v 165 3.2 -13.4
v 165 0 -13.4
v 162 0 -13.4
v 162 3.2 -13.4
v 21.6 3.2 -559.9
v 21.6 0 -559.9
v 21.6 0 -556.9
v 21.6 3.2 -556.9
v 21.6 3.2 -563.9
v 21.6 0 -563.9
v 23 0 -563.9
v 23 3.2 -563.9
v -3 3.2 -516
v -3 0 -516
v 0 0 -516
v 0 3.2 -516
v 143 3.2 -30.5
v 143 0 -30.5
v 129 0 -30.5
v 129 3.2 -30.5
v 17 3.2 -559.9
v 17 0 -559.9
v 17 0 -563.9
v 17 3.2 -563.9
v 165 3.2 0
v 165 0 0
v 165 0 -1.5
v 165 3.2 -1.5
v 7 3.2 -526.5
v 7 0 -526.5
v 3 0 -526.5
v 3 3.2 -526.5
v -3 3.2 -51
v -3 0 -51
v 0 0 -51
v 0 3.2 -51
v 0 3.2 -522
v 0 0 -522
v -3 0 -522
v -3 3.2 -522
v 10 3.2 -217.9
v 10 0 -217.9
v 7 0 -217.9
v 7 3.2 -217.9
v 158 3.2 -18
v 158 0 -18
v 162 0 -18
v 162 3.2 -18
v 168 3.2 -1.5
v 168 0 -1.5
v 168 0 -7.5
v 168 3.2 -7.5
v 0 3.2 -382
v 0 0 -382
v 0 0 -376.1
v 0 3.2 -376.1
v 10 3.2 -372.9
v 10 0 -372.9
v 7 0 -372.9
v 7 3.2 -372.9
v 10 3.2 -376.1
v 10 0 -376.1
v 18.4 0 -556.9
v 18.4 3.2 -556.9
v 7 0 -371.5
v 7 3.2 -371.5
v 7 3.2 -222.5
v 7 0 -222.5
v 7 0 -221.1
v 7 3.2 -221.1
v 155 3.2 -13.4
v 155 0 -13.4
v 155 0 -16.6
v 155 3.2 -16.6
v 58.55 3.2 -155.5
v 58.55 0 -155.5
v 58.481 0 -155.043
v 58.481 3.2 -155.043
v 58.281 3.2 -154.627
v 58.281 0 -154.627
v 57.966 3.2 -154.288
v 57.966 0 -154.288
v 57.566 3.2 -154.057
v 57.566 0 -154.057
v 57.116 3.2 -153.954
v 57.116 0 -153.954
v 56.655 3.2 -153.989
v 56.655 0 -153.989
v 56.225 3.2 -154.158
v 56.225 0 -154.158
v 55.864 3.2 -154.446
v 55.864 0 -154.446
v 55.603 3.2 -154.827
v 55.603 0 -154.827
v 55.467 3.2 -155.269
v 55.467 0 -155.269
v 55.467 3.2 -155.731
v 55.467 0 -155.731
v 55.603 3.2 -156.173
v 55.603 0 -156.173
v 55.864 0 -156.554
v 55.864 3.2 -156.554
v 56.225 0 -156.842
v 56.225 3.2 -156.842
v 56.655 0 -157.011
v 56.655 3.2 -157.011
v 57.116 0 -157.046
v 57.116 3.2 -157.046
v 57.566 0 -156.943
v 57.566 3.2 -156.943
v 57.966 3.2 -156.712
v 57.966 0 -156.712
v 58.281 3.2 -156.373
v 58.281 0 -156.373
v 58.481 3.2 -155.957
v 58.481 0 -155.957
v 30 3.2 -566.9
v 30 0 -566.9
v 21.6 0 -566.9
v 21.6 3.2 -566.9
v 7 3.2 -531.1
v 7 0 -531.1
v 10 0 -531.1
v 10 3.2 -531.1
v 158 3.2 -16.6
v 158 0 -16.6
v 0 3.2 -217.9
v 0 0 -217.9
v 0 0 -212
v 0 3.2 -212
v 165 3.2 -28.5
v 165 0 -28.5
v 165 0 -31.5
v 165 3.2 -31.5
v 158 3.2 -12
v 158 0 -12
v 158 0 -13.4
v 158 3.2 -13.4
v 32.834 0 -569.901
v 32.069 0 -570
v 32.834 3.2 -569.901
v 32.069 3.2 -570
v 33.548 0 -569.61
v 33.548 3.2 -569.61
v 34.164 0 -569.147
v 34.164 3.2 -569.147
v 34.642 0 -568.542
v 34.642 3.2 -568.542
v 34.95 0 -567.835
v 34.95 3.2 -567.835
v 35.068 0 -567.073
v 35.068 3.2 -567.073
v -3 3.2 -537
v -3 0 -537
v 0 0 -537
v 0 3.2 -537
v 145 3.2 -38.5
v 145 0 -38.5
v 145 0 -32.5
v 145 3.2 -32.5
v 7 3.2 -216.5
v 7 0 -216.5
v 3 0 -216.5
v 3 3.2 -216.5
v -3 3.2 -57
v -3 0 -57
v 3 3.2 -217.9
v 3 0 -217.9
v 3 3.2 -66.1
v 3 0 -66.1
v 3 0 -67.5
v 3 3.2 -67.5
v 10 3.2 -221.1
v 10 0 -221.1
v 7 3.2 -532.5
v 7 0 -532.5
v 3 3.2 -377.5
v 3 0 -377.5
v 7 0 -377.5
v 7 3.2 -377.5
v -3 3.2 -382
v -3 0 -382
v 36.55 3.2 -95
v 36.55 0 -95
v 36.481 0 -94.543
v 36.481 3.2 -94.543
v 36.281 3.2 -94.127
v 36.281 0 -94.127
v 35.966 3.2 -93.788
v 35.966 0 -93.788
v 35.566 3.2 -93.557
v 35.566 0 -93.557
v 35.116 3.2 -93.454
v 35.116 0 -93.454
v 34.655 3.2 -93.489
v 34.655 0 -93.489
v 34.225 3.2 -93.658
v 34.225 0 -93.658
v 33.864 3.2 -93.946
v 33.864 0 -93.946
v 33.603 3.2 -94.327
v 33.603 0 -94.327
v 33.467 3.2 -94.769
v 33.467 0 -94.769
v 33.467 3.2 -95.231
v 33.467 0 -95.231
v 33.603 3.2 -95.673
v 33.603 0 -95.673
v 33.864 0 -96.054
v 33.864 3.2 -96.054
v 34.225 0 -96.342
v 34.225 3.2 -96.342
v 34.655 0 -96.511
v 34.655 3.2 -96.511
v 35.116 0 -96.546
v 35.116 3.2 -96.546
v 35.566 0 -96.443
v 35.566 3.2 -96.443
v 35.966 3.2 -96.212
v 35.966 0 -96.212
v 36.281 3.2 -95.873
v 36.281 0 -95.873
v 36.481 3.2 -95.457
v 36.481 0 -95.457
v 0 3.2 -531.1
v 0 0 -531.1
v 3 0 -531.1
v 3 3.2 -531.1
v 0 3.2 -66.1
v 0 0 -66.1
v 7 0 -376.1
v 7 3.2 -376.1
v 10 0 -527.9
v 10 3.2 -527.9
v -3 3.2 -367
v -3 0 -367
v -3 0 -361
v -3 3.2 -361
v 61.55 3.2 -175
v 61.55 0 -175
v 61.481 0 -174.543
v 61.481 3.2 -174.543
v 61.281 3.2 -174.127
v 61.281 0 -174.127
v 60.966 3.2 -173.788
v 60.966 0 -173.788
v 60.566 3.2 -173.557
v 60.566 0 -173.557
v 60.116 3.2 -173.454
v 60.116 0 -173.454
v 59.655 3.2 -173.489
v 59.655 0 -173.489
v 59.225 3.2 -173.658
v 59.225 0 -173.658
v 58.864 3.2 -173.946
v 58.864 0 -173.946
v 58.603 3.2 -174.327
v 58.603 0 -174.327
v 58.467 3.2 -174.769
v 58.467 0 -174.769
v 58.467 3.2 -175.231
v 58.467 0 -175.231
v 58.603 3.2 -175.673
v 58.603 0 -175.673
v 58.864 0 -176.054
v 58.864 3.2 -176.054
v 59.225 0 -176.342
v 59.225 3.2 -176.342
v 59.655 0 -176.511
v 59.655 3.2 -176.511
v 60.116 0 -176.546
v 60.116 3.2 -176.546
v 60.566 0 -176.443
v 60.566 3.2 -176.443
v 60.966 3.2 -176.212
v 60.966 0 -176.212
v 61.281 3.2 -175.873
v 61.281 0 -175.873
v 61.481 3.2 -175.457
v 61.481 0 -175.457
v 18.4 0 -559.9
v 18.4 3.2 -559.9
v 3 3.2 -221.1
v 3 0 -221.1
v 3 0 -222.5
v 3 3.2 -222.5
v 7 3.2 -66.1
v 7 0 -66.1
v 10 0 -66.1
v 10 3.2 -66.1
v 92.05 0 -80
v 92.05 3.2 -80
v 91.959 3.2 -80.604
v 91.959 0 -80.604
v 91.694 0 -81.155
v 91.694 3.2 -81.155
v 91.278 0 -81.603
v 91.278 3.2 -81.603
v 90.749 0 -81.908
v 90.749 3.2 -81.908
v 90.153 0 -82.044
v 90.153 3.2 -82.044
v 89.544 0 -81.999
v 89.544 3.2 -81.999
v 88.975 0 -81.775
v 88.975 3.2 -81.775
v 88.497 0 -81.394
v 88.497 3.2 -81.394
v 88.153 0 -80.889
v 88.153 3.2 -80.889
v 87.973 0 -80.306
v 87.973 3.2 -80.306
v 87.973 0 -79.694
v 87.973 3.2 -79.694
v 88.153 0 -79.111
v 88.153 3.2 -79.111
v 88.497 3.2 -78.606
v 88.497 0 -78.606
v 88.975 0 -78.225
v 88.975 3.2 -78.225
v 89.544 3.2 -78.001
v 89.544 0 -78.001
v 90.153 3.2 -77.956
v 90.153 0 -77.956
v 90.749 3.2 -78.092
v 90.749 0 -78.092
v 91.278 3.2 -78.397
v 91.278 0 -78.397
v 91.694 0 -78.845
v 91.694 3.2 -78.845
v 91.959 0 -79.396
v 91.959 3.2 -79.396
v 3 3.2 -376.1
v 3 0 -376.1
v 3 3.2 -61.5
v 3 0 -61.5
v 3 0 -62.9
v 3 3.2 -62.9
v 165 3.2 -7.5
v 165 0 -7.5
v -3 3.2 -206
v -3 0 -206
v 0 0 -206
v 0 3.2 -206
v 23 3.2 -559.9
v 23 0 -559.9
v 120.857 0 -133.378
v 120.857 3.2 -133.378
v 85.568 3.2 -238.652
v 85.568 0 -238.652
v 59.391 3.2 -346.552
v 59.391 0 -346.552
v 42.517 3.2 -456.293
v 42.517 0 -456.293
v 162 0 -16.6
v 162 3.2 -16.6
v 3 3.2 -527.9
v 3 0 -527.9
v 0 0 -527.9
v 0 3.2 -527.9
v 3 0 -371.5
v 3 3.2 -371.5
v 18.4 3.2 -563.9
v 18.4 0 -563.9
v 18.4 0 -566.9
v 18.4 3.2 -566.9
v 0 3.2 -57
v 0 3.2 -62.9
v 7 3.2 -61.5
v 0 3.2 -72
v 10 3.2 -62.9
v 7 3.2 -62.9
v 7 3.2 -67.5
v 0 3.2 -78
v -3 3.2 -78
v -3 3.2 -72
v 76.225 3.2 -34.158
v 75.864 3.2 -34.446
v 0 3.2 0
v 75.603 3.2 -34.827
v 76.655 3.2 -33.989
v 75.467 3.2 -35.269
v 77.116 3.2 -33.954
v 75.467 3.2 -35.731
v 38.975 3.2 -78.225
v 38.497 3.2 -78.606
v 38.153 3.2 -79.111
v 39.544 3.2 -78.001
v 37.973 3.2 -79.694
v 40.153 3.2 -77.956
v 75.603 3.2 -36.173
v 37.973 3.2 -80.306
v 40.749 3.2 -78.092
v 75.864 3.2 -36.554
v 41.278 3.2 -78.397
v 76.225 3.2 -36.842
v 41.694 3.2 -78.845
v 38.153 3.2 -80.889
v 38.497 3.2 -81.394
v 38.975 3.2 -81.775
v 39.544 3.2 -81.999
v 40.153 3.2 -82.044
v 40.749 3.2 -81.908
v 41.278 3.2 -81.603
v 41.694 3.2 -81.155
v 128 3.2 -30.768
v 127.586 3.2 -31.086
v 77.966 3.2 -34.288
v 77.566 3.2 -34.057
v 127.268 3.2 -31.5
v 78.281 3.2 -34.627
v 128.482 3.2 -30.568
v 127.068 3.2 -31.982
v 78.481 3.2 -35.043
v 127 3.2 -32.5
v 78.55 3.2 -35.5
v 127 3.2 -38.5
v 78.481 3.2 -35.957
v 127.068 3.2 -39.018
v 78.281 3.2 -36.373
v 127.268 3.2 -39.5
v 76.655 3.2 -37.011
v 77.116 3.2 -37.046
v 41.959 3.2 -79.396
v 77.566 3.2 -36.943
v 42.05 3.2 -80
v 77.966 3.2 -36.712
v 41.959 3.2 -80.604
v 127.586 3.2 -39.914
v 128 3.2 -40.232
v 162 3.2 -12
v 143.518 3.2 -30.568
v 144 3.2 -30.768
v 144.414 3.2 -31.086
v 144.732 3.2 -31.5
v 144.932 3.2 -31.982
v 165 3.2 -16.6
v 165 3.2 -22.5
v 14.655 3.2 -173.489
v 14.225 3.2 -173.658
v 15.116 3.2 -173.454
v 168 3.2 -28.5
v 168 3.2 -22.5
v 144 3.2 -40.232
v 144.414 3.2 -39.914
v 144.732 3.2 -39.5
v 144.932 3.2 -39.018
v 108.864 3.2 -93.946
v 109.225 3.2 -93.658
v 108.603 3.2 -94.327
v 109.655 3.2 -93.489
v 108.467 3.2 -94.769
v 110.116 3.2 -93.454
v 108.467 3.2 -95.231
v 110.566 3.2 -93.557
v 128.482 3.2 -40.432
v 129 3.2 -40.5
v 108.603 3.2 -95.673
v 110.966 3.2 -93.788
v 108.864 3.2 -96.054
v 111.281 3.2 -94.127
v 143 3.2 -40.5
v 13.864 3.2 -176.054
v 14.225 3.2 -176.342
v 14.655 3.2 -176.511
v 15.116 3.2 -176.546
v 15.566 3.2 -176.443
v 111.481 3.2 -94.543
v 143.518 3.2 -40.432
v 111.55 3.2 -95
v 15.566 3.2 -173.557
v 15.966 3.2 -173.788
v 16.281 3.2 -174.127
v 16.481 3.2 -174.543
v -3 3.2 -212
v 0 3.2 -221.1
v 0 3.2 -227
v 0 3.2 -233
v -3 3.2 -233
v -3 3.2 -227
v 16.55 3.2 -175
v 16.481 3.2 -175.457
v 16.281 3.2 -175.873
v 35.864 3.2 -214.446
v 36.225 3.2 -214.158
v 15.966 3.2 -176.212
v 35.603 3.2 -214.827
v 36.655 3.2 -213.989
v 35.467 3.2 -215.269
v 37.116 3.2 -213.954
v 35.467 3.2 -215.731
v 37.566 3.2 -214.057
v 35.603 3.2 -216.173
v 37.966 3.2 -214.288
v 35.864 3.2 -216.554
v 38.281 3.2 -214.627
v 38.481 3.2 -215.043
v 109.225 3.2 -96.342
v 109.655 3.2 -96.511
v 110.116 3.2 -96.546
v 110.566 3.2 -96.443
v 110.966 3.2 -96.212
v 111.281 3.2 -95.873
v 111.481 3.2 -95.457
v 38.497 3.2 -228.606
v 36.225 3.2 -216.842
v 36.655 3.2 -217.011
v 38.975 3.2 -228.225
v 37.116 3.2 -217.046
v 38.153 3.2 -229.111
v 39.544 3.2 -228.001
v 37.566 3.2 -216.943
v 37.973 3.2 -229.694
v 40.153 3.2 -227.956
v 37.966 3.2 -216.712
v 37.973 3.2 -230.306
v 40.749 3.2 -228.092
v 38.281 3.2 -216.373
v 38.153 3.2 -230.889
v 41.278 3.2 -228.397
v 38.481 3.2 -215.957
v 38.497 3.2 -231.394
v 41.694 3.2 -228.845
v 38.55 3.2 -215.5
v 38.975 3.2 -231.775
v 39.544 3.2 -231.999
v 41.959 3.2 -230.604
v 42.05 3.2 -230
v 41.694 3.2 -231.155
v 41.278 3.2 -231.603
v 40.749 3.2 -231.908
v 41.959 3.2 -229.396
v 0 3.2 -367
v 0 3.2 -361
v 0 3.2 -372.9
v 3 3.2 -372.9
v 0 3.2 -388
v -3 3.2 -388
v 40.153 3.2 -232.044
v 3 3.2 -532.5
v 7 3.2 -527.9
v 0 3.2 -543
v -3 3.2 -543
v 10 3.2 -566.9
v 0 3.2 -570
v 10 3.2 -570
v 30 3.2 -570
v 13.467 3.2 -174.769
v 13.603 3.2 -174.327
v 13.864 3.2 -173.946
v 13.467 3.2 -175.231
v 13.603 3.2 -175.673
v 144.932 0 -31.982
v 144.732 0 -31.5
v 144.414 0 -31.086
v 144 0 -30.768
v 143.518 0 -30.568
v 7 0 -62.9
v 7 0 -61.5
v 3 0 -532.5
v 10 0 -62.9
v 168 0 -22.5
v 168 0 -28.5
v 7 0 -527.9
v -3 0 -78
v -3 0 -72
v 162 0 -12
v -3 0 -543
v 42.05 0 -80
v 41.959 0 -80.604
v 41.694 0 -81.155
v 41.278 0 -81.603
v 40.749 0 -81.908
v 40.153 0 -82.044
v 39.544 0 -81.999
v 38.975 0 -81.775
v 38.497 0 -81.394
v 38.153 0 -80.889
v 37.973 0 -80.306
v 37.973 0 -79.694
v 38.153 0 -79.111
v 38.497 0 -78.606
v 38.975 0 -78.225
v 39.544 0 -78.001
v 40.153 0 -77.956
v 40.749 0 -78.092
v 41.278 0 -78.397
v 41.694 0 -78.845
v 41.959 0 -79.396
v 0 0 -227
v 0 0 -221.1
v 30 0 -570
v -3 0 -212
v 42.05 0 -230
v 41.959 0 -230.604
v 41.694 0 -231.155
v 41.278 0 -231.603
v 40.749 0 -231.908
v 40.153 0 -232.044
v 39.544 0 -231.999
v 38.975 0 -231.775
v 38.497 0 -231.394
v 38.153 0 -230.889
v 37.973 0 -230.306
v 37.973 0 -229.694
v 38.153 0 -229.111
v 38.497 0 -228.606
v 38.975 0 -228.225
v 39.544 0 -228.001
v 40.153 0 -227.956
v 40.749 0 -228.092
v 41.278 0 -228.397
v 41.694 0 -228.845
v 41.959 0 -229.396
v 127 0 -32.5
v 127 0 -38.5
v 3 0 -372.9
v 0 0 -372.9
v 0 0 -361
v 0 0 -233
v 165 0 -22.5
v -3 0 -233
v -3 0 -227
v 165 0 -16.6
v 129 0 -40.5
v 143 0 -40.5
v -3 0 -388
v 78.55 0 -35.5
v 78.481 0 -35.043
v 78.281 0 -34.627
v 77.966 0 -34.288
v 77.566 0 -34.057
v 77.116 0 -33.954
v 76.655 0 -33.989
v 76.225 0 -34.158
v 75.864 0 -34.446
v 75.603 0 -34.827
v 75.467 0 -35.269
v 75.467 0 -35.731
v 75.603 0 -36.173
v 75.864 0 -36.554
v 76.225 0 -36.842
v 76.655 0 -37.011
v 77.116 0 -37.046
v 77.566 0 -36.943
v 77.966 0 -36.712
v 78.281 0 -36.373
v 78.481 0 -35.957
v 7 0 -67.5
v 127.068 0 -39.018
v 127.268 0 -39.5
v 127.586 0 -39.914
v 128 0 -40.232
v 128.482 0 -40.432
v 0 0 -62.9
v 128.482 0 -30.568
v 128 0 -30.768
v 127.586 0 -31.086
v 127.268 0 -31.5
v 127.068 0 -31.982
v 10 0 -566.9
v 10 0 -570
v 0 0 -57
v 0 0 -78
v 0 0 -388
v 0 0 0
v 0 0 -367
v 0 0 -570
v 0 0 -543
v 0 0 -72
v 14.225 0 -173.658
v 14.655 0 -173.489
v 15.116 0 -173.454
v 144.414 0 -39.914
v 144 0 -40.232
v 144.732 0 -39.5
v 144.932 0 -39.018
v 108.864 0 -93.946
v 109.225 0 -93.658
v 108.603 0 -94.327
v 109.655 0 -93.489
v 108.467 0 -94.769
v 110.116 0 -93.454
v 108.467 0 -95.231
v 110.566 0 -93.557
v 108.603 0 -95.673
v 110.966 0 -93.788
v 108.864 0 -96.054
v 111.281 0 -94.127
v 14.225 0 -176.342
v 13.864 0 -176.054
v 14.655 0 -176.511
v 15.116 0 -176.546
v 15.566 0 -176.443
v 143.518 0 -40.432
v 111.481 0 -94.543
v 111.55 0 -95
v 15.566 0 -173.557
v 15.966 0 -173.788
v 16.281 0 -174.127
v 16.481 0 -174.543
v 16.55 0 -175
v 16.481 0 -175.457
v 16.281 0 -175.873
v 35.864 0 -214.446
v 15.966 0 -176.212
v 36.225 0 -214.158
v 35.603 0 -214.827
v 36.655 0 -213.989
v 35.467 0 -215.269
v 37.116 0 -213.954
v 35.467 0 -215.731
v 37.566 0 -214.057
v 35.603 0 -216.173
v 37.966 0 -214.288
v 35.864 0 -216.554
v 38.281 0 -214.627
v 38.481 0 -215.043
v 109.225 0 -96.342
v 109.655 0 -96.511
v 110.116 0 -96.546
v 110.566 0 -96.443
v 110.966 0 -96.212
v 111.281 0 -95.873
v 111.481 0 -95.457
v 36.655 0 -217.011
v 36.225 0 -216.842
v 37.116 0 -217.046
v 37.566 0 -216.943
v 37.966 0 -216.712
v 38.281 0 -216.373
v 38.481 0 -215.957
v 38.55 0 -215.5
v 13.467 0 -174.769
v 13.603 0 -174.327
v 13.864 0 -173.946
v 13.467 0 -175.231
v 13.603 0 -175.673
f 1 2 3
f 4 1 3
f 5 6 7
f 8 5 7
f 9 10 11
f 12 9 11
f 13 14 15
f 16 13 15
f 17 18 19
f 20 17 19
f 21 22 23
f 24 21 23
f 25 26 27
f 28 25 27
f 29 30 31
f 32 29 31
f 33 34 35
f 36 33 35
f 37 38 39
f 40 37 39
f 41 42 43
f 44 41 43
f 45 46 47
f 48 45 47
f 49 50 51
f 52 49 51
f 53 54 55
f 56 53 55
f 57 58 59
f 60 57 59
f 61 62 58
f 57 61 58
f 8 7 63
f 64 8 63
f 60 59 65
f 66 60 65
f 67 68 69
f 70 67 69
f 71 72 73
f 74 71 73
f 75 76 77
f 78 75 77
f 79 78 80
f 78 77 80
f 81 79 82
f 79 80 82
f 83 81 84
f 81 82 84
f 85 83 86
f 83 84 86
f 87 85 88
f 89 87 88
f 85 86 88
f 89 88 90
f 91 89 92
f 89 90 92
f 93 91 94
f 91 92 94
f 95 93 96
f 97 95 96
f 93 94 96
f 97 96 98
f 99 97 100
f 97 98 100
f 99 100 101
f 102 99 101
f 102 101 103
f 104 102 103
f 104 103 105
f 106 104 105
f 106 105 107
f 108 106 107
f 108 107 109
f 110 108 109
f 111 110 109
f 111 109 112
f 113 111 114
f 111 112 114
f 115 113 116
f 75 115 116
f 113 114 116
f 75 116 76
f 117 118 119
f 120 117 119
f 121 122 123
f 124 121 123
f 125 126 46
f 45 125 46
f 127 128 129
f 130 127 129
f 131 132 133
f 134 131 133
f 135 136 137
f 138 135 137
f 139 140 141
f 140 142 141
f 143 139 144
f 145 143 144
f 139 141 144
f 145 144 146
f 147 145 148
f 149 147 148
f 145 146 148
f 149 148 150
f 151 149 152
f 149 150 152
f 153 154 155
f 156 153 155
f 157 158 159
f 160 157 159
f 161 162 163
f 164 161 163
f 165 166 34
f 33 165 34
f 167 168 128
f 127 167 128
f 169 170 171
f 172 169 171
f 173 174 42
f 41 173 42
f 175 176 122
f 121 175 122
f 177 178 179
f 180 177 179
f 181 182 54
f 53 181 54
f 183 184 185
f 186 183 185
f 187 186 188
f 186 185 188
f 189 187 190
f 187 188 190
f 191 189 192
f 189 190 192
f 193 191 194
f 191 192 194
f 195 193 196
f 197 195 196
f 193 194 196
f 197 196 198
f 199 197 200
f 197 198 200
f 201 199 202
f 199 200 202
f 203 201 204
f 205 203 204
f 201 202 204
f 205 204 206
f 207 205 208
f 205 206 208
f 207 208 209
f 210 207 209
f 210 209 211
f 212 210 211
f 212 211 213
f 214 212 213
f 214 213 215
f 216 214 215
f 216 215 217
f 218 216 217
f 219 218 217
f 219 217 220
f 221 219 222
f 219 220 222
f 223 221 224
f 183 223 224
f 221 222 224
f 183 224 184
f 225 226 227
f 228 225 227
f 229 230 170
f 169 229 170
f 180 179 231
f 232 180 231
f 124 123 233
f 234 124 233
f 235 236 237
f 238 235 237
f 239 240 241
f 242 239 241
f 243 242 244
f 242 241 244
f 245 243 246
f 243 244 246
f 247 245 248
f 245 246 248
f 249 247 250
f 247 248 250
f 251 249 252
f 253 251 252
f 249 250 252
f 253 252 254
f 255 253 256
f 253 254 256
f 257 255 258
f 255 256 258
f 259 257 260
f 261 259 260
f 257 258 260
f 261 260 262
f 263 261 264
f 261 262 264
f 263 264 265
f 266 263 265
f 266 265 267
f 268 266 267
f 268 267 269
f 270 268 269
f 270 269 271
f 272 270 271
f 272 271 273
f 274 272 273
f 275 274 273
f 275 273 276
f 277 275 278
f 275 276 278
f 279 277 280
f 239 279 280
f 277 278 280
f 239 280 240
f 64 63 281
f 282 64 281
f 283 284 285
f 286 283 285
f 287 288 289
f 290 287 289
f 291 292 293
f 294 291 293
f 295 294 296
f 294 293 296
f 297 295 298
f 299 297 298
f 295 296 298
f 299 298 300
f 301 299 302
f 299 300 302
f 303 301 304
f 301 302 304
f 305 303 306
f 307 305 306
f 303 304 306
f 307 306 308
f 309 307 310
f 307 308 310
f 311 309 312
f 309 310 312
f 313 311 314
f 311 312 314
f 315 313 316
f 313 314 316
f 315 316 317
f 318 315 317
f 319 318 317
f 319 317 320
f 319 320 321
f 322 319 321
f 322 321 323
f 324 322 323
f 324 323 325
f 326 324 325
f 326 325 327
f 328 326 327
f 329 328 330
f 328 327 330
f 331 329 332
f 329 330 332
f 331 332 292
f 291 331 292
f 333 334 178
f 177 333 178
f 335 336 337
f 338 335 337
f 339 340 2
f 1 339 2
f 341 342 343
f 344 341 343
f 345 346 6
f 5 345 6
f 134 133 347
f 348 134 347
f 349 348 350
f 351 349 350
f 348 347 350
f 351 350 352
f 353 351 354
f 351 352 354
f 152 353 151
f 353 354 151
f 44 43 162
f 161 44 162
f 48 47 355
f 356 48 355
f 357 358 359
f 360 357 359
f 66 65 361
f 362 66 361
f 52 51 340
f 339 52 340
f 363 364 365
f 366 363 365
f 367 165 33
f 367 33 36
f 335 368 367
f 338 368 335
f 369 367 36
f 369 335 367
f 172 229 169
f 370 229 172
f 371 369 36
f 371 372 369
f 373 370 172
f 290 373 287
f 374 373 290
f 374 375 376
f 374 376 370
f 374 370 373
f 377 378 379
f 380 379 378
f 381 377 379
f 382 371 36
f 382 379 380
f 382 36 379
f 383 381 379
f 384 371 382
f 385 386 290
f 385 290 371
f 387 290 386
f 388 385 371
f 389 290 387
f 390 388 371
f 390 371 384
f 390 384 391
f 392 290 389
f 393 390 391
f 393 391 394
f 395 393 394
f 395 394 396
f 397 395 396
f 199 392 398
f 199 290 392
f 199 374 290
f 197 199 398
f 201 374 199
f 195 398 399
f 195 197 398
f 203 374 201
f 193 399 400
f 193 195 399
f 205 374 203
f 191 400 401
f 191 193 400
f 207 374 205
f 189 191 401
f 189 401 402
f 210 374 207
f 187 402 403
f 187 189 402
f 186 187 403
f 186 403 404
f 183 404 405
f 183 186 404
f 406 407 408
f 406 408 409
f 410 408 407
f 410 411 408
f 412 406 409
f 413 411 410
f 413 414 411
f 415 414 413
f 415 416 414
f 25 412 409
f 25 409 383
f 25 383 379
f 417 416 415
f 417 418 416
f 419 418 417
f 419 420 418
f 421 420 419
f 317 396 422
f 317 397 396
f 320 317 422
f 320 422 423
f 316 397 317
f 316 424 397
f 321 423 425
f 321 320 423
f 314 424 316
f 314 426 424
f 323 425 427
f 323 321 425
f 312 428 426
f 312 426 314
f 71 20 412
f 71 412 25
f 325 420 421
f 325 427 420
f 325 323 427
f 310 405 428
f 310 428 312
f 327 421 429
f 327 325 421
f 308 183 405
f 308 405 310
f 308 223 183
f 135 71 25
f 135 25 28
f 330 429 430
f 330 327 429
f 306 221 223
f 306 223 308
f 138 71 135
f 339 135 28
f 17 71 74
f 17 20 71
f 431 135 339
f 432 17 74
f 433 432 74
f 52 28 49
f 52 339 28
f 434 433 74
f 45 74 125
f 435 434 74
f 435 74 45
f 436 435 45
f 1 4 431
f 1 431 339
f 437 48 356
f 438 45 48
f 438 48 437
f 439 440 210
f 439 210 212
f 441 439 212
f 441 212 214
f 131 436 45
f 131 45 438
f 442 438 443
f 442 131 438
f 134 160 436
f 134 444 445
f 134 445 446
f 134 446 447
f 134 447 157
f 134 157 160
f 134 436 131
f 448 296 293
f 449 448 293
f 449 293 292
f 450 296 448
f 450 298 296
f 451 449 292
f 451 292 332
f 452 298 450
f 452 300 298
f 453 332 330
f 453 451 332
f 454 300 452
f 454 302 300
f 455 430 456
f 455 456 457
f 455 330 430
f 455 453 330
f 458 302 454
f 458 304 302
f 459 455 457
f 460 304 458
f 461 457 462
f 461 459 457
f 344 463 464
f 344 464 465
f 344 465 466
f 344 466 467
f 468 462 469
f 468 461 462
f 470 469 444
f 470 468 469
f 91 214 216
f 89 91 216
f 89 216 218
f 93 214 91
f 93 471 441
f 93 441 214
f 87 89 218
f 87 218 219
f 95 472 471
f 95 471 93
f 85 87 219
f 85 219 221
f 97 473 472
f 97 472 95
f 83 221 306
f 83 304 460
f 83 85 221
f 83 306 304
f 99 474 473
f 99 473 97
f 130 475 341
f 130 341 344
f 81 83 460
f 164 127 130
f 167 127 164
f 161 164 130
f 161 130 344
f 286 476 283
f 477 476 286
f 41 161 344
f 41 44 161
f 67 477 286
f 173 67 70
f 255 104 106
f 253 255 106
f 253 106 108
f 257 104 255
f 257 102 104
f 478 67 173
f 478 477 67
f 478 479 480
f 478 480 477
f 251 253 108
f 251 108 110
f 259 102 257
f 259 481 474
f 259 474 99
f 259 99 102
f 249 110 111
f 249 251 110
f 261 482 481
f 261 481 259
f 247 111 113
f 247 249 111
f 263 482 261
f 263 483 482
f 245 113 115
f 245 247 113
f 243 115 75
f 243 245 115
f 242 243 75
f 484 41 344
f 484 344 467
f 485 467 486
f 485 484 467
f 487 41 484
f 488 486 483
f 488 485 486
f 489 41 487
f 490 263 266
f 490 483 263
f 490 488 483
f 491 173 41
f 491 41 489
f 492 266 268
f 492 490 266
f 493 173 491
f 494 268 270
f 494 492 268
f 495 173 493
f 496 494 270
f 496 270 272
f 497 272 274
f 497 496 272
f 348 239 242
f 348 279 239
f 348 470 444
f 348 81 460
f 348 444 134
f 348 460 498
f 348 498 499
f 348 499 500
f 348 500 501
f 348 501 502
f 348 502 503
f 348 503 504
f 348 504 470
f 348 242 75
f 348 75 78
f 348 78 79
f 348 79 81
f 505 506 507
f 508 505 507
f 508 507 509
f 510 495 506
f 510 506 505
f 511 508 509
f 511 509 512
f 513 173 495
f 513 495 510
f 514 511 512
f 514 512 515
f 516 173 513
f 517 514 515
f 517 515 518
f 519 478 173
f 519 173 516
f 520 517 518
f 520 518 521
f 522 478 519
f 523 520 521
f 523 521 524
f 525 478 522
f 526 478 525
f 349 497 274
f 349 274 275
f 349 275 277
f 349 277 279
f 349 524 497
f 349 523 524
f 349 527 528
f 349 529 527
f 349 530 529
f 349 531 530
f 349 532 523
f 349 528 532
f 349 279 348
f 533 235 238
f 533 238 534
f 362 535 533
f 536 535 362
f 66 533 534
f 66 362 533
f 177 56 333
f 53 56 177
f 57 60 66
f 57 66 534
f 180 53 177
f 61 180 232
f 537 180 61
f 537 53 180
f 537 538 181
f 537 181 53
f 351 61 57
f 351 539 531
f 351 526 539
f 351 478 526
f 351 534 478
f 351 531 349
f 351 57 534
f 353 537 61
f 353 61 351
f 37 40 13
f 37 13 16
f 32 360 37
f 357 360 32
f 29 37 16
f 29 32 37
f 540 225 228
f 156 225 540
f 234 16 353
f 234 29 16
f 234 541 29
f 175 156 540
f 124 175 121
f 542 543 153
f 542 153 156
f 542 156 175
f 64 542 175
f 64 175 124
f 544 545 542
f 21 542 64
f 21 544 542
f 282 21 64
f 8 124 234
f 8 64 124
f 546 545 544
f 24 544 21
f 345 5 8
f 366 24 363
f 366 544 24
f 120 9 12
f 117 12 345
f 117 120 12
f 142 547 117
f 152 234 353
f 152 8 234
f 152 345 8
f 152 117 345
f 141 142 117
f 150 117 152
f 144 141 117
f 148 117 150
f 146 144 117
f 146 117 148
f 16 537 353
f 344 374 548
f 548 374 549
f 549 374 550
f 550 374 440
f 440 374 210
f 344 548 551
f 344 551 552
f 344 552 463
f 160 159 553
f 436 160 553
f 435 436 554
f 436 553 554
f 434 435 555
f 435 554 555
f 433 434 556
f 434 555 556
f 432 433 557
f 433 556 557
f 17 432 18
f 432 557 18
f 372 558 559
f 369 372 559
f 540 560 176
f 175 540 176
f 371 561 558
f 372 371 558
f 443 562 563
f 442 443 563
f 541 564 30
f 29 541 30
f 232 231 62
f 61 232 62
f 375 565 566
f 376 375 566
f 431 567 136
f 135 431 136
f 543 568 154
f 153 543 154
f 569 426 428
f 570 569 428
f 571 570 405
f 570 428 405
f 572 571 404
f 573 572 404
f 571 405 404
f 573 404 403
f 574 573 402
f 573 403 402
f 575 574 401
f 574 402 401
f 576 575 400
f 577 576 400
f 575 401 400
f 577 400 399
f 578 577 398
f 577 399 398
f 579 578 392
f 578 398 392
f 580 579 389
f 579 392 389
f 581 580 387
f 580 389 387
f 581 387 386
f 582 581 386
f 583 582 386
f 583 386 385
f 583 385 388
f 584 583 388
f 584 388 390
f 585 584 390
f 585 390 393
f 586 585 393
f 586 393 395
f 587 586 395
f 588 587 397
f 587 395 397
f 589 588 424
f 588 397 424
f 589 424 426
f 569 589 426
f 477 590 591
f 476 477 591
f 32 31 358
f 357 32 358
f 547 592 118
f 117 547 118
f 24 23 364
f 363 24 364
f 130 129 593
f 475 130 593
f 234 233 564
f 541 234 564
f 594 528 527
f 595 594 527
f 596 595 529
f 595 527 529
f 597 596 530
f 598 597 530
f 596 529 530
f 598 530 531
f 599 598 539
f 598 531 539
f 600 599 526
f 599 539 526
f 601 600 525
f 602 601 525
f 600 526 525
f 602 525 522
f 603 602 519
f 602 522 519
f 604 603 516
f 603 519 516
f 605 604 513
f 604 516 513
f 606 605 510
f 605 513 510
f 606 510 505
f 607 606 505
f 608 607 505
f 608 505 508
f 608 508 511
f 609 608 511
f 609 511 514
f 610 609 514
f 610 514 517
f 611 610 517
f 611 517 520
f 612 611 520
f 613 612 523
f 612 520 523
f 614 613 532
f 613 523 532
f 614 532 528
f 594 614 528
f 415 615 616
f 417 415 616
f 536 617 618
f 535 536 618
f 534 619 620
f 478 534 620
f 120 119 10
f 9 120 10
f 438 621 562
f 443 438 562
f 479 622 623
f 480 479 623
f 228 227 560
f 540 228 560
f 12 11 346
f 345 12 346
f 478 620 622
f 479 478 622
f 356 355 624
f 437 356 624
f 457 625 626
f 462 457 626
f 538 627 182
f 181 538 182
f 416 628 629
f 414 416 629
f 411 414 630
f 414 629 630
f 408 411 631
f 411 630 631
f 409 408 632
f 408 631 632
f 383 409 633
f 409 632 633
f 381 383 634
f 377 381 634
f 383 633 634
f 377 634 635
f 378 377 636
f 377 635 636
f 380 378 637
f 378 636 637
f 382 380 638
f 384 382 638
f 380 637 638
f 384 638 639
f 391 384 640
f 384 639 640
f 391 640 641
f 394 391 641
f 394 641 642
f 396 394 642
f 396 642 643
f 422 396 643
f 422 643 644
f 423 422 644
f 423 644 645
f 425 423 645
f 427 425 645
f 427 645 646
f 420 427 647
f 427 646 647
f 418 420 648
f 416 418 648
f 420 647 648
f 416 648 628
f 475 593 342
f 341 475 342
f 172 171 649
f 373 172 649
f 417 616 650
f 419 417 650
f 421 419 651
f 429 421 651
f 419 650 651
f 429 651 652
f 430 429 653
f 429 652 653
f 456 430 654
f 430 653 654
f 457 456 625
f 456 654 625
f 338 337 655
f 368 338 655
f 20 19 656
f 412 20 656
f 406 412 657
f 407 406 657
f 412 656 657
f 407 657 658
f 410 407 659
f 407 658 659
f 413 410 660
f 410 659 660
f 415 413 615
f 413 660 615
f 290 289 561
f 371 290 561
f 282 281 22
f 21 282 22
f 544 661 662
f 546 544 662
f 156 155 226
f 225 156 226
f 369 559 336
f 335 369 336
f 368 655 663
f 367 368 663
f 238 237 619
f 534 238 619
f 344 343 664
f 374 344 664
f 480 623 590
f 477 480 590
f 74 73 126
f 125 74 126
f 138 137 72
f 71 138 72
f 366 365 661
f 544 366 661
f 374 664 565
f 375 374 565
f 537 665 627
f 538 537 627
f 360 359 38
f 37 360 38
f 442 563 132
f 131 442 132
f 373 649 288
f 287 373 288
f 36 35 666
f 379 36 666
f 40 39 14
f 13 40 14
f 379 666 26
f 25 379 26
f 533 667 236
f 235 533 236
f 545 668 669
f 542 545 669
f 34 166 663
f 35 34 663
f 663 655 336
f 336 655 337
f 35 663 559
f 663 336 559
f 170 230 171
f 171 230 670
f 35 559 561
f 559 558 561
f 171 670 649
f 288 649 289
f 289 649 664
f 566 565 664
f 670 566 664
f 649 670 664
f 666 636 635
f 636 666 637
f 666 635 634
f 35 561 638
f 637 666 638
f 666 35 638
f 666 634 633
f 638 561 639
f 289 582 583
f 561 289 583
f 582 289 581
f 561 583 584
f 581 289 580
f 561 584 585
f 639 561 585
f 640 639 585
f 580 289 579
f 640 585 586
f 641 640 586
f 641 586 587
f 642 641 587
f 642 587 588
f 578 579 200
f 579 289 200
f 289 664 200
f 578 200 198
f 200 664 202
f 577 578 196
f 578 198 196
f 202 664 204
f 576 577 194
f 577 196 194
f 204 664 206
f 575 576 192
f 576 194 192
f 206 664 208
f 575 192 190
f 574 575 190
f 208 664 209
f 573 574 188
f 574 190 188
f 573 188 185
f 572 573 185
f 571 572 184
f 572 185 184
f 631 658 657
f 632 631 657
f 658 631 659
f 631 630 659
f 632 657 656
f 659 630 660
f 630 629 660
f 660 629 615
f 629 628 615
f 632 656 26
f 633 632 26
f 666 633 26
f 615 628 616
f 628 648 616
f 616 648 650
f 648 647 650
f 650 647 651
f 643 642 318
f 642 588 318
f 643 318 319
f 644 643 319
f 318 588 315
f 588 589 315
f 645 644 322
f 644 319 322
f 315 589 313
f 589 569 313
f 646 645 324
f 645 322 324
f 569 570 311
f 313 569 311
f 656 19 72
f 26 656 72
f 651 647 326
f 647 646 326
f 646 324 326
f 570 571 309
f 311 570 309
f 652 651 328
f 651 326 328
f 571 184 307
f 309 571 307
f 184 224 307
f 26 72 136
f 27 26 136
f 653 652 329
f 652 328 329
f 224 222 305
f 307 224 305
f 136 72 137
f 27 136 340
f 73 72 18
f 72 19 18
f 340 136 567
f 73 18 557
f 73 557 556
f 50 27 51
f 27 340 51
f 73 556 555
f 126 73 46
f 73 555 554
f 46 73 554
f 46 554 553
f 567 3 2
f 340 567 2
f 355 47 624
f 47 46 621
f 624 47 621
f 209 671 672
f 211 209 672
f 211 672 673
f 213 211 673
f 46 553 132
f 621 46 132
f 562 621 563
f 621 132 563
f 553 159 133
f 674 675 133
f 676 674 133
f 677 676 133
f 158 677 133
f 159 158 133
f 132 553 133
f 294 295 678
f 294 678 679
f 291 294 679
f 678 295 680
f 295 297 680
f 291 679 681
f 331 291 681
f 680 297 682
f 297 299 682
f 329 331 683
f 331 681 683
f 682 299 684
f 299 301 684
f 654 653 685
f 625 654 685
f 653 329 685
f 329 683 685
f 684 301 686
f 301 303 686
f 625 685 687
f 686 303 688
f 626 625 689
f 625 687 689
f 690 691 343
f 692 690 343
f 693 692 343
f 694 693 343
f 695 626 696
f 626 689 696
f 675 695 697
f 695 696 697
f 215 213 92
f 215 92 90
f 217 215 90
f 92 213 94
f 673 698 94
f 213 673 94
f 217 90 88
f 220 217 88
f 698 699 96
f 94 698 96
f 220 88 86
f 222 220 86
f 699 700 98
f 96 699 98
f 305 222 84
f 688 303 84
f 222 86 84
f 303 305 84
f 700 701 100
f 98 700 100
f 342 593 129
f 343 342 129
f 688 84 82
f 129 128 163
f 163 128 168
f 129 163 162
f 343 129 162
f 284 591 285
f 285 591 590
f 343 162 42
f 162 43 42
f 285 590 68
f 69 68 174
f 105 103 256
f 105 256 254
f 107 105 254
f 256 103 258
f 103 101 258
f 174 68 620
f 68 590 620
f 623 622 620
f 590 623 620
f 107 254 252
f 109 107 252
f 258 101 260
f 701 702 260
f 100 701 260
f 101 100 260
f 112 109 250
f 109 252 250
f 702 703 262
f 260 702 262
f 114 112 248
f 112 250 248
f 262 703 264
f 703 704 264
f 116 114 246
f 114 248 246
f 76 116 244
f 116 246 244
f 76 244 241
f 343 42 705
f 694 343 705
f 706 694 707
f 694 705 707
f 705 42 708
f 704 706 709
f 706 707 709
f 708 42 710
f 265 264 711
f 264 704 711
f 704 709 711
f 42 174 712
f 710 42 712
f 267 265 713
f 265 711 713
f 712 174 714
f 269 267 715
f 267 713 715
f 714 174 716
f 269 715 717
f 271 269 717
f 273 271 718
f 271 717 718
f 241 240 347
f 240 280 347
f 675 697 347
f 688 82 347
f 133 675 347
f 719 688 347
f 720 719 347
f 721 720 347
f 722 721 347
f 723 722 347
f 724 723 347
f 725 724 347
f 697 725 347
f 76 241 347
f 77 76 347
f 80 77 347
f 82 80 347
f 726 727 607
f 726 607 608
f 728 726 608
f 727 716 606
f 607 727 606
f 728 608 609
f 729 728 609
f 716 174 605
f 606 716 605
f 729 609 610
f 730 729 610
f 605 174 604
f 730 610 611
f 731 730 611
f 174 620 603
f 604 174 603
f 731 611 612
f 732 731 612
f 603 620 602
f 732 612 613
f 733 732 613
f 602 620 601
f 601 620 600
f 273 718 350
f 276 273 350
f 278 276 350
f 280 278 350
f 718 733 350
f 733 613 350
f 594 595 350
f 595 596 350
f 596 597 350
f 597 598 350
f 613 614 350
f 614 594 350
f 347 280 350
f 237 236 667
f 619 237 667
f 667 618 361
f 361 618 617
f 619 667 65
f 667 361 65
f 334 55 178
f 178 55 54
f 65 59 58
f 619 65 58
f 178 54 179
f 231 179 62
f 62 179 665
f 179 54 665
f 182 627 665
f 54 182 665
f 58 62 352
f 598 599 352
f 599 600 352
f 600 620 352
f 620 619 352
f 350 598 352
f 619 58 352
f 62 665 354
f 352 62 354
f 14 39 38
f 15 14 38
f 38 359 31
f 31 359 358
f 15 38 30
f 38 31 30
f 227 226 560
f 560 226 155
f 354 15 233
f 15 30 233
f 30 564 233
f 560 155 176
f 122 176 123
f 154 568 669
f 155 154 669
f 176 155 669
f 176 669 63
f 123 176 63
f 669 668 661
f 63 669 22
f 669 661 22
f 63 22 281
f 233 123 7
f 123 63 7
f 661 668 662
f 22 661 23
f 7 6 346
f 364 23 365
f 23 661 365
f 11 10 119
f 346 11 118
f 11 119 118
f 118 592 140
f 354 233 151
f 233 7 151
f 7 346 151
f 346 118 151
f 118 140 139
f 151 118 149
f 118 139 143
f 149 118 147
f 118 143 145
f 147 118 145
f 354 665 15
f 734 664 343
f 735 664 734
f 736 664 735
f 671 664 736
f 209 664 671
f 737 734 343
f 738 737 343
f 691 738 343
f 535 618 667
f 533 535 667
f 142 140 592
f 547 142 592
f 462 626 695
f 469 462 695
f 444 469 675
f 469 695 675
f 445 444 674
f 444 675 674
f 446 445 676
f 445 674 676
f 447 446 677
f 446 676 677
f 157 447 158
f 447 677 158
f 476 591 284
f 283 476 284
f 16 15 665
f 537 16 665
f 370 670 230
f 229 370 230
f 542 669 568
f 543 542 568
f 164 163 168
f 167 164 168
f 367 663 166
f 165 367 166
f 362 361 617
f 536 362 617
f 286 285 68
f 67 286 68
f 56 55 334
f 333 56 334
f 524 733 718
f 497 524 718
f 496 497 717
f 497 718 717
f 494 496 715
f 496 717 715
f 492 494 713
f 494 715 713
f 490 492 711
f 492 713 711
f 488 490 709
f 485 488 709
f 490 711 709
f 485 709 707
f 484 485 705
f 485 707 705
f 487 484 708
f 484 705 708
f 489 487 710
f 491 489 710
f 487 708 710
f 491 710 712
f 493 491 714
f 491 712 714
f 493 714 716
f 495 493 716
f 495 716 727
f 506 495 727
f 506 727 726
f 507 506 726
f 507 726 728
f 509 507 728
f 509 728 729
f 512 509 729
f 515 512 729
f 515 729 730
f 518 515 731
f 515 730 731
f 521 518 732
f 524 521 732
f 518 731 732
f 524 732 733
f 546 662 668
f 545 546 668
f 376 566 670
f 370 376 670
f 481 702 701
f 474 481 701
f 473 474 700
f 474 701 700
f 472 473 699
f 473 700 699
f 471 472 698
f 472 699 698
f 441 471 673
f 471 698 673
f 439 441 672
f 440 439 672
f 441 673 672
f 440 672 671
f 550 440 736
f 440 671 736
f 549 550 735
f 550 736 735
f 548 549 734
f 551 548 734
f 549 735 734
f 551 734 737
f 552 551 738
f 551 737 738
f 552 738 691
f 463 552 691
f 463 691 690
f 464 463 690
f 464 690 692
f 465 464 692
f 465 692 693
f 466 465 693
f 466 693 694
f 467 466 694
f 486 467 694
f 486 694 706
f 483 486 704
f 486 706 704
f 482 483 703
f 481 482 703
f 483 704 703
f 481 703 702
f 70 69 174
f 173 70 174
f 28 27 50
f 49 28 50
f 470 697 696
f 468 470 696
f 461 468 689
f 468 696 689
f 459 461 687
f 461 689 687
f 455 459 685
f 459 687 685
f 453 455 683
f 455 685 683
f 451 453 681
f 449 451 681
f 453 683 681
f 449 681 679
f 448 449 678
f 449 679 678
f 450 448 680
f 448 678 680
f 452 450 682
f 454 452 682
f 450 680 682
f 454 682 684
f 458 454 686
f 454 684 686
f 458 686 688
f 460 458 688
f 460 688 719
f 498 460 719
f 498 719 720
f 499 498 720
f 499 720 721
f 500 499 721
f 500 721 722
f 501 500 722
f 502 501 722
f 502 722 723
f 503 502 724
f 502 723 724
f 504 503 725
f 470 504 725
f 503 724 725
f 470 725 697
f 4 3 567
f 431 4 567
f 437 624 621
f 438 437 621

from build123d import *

# Parameters (mm, degrees)
SALIENTE_EXTRUIR1_DEPTH = 3.2
CROQUIS3_R              = 2.05
CORTAR_EXTRUIR2_DEPTH   = 3.2
CORTAR_EXTRUIR3_DEPTH   = 3.2
CORTAR_EXTRUIR4_DEPTH   = 3.2
REDONDEO1_R             = 3
CROQUIS6_R              = 1.55
CORTAR_EXTRUIR5_DEPTH   = 3.2


with BuildPart() as part:
    # Croquis1 → Saliente-Extruir1 (new body)
    with BuildSketch(Plane(origin=(0, 0, 0), x_dir=(1, 0, 0), z_dir=(0, 1, 0))):
        Polygon((7, 66.1), (10, 66.1), (10, 62.9), (7, 62.9), (7, 61.5), (3, 61.5), (3, 62.9), (0, 62.9), (0, 57), (-3, 57), (-3, 51), (0, 51), (0, 0), (165, 0), (165, 1.5), (168, 1.5), (168, 7.5), (165, 7.5), (165, 13.4), (162, 13.4), (162, 12), (158, 12), (158, 13.4), (155, 13.4), (155, 16.6), (158, 16.6), (158, 18), (162, 18), (162, 16.6), (165, 16.6), (165, 22.5), (168, 22.5), (168, 28.5), (165, 28.5), (165, 570), (30, 570), (30, 566.9), (21.6, 566.9), (21.6, 563.9), (23, 563.9), (23, 559.9), (21.6, 559.9), (21.6, 556.9), (18.4, 556.9), (18.4, 559.9), (17, 559.9), (17, 563.9), (18.4, 563.9), (18.4, 566.9), (10, 566.9), (10, 570), (0, 570), (0, 543), (-3, 543), (-3, 537), (0, 537), (0, 531.1), (3, 531.1), (3, 532.5), (7, 532.5), (7, 531.1), (10, 531.1), (10, 527.9), (7, 527.9), (7, 526.5), (3, 526.5), (3, 527.9), (0, 527.9), (0, 522), (-3, 522), (-3, 516), (0, 516), (0, 388), (-3, 388), (-3, 382), (0, 382), (0, 376.1), (3, 376.1), (3, 377.5), (7, 377.5), (7, 376.1), (10, 376.1), (10, 372.9), (7, 372.9), (7, 371.5), (3, 371.5), (3, 372.9), (0, 372.9), (0, 367), (-3, 367), (-3, 361), (0, 361), (0, 233), (-3, 233), (-3, 227), (0, 227), (0, 221.1), (3, 221.1), (3, 222.5), (7, 222.5), (7, 221.1), (10, 221.1), (10, 217.9), (7, 217.9), (7, 216.5), (3, 216.5), (3, 217.9), (0, 217.9), (0, 212), (-3, 212), (-3, 206), (0, 206), (0, 78), (-3, 78), (-3, 72), (0, 72), (0, 66.1), (3, 66.1), (3, 67.5), (7, 67.5), align=None)
    extrude(amount=SALIENTE_EXTRUIR1_DEPTH)

    # Croquis3 → Cortar-Extruir2 (cut)
    with BuildSketch(Plane(origin=(0, 3.2, 0), x_dir=(1, 0, 0), z_dir=(0, 1, 0))):
        with Locations((40, 80)):
            Circle(CROQUIS3_R)
        with Locations((90, 80)):
            Circle(CROQUIS3_R)
        with Locations((40, 230)):
            Circle(CROQUIS3_R)
    extrude(amount=-CORTAR_EXTRUIR2_DEPTH, mode=Mode.SUBTRACT)

    # Croquis4 → Cortar-Extruir3 (cut)
    with BuildSketch(Plane.XZ):
        with BuildLine():
            Line((143, -30.5), (129, -30.5))
            ThreePointArc((129, -30.5), (127.585786438, -31.085786438), (127, -32.5))
            Line((127, -32.5), (127, -38.5))
            ThreePointArc((127, -38.5), (127.585786438, -39.914213562), (129, -40.5))
            Line((129, -40.5), (143, -40.5))
            ThreePointArc((143, -40.5), (144.414213562, -39.914213562), (145, -38.5))
            Line((145, -38.5), (145, -32.5))
            ThreePointArc((145, -32.5), (144.414213562, -31.085786438), (143, -30.5))
        make_face()
    extrude(amount=-CORTAR_EXTRUIR3_DEPTH, mode=Mode.SUBTRACT)

    # Croquis5 → Cortar-Extruir4 (cut)
    with BuildSketch(Plane.XZ):
        with BuildLine():
            Line((35, -570), (165, -570))
            Line((165, -570), (165, -31.5))
            ThreePointArc((165, -31.5), (70.982951471, -293.744955787), (35, -570))
        make_face()
    extrude(amount=-CORTAR_EXTRUIR4_DEPTH, mode=Mode.SUBTRACT)

    # Redondeo1
    redondeo1_edges = [part.edges().sort_by_distance(p)[0] for p in [
        (35, 1.6, -570),
    ]]
    fillet(redondeo1_edges, radius=REDONDEO1_R)

    # Croquis6 → Cortar-Extruir5 (cut)
    with BuildSketch(Plane.XZ):
        with Locations((110, -95)):
            Circle(CROQUIS6_R)
        with Locations((35, -95)):
            Circle(CROQUIS6_R)
        with Locations((60, -175)):
            Circle(CROQUIS6_R)
        with Locations((15, -175)):
            Circle(CROQUIS6_R)
        with Locations((77, -35.5)):
            Circle(CROQUIS6_R)
        with Locations((37, -215.5)):
            Circle(CROQUIS6_R)
        with Locations((57, -155.5)):
            Circle(CROQUIS6_R)
    extrude(amount=-CORTAR_EXTRUIR5_DEPTH, mode=Mode.SUBTRACT)


solid = part.part
